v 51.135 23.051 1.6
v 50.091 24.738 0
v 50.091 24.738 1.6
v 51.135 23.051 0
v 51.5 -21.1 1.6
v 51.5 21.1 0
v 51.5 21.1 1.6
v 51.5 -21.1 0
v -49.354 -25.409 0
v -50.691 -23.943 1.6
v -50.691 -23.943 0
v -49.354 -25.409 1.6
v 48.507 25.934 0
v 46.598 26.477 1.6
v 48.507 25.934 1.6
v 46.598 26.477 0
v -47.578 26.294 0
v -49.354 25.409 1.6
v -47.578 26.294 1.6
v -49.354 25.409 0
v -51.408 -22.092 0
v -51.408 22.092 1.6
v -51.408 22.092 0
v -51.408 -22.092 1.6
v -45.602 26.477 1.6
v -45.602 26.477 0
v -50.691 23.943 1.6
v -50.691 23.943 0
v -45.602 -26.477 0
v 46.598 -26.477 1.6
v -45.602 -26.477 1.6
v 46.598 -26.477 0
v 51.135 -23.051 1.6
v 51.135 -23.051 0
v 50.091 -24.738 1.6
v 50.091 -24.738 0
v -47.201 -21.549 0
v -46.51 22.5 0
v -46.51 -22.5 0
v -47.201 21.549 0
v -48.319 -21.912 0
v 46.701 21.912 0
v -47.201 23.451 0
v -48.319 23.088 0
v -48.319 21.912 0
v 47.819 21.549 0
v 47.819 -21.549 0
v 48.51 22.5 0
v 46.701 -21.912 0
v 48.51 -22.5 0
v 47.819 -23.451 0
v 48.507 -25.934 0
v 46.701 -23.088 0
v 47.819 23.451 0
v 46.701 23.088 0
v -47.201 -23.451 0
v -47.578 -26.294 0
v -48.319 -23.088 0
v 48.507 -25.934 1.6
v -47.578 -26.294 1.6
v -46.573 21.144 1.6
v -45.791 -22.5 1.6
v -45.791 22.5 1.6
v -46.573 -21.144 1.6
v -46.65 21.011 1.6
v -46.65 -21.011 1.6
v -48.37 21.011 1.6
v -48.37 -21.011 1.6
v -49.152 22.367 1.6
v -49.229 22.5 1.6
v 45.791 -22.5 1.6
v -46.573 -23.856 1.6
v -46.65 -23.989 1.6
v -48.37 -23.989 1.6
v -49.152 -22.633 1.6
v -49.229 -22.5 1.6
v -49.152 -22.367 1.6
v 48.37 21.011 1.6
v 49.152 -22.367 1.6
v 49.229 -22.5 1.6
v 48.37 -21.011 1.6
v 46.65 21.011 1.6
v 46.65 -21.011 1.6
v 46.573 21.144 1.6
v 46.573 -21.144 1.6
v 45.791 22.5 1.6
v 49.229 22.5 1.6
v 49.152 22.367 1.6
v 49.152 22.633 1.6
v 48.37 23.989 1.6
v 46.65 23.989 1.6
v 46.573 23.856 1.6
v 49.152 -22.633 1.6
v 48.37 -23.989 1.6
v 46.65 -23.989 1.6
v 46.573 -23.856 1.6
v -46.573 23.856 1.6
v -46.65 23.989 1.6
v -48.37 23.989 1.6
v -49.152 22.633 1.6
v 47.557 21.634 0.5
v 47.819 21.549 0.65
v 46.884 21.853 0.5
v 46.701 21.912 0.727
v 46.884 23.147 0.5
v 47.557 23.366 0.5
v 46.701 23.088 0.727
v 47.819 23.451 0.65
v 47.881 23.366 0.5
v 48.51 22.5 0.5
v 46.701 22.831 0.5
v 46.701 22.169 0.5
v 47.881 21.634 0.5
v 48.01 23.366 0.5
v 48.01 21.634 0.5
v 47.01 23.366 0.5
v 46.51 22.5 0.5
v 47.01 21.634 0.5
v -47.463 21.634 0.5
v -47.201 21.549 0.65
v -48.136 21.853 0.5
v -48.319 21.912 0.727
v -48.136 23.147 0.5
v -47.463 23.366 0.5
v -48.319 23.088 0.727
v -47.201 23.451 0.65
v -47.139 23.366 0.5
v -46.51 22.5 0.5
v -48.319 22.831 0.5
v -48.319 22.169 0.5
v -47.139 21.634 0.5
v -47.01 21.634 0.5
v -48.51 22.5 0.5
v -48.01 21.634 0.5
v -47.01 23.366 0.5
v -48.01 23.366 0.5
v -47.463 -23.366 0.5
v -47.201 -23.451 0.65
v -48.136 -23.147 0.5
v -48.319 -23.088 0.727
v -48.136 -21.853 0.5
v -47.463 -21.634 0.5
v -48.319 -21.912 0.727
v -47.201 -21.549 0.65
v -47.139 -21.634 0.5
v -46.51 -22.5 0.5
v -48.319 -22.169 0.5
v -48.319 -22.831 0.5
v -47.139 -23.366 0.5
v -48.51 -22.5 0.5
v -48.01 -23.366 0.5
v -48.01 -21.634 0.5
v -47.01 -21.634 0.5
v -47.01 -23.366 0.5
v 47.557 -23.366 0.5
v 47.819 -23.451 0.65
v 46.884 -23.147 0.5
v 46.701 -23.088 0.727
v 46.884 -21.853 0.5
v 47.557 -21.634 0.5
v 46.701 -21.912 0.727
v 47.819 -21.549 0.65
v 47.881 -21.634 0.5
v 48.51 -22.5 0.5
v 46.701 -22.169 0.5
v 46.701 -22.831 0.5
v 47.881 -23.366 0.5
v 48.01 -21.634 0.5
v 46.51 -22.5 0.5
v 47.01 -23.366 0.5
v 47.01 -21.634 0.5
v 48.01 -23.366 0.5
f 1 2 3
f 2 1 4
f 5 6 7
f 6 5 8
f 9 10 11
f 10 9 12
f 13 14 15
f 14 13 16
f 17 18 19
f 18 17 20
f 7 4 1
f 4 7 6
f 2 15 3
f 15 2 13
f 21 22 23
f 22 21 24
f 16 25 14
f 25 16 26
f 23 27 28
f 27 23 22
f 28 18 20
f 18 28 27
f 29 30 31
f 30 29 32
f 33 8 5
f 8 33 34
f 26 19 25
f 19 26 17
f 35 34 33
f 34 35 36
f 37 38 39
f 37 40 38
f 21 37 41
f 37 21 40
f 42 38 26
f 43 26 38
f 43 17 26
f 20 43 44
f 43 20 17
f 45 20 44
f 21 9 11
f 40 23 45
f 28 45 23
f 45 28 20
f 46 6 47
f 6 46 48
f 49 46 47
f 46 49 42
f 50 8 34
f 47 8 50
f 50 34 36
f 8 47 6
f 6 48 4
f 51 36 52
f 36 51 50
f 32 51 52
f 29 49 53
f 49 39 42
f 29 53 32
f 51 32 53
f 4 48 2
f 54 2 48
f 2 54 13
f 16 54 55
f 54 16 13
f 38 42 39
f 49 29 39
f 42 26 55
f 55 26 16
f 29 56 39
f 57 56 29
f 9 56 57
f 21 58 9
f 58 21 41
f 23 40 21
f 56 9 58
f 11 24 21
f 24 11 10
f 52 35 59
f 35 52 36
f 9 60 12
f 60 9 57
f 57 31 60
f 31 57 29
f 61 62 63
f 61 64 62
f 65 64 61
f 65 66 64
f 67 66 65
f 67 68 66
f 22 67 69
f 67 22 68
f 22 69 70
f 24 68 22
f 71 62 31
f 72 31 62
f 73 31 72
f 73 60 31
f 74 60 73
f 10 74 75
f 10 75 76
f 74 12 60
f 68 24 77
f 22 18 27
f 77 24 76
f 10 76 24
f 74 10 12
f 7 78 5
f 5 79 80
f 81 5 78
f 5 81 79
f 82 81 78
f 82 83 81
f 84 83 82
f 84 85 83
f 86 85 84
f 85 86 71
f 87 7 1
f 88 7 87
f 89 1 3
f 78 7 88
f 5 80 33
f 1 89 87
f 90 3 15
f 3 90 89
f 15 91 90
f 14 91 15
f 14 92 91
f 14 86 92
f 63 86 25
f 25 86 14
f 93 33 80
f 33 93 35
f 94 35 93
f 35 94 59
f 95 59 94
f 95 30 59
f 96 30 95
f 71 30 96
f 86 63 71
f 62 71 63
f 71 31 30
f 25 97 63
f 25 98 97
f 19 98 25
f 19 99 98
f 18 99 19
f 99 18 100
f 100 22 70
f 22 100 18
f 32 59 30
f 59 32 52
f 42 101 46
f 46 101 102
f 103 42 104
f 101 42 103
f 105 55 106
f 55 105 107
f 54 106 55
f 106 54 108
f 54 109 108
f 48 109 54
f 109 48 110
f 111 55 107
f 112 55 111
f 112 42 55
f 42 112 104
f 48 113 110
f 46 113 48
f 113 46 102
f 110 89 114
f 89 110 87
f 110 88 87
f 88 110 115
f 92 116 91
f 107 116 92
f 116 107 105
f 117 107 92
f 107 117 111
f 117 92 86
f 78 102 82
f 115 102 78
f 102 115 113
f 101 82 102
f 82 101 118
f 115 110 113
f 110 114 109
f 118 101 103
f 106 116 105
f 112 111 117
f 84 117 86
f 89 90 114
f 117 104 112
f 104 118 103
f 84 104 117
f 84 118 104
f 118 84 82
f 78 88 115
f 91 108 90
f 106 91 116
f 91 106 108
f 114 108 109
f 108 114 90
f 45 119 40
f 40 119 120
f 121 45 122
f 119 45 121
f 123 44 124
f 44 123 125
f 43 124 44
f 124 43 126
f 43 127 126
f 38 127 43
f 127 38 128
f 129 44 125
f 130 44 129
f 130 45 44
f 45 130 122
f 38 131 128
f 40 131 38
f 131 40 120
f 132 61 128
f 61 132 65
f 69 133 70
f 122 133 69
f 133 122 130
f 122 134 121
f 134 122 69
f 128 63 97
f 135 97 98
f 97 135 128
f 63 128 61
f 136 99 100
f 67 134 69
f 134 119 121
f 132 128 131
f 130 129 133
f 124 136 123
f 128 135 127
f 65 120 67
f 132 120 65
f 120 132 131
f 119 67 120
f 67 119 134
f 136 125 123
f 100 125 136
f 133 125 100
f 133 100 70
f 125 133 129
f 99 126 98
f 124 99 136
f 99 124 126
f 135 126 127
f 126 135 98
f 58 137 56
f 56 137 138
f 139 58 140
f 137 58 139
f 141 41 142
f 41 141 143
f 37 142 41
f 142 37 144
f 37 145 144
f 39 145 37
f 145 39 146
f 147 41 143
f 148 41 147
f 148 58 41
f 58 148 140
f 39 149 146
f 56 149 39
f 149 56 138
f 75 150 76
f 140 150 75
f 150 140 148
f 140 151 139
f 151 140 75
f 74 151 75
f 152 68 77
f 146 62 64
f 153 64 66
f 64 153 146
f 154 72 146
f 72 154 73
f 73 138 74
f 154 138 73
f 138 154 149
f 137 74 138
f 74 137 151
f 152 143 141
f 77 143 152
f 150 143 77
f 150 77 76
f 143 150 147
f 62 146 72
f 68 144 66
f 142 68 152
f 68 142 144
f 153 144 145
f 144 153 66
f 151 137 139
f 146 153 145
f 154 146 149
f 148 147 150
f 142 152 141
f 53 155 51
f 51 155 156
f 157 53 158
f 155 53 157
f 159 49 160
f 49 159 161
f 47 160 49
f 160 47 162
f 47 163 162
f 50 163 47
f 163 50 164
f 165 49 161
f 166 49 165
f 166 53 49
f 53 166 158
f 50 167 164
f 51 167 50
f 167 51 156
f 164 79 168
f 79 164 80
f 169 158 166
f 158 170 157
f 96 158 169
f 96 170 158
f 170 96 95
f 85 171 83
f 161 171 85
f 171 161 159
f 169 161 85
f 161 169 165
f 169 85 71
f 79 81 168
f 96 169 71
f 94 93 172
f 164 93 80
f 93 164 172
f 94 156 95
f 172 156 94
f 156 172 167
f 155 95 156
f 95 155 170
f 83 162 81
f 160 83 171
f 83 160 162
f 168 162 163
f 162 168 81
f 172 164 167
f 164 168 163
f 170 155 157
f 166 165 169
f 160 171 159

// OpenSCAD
// file: ../configuration.scad
//UNIBOX04A
//------------------------------------------------------------
///*

rozmer_x=103;
rozmer_y=53;
sila=1.5;

roztec_srouby_x=95.02;
roztec_srouby_y=45;
prumer_sroubu=2;
zakulaceni_hrany=5.4;

roztec_der=10.16;
pocet_der_osa_x=8;
// main file
include <../configuration.scad>


//PLBASE ZAKLADNI
//------------------------------------------------------------

UNIBOX04A_D01();

module UNIBOX04A_D01(){

    difference () {

        translate([-(rozmer_x/2-zakulaceni_hrany),-(rozmer_y/2-zakulaceni_hrany),0]) 
            minkowski()
                {
                	cube([rozmer_x-2*zakulaceni_hrany,rozmer_y-2*zakulaceni_hrany,sila]);         
                        cylinder(r=zakulaceni_hrany,h=0.1);
                }
          
        //otvory
        translate([roztec_srouby_x/2,roztec_srouby_y/2,0])
            cylinder(sila*5, d=prumer_sroubu, center=true);   
        translate([roztec_srouby_x/2,roztec_srouby_y/2,0.5])
            cylinder(1.3, d1=prumer_sroubu, d2=3.7);   

          
        translate([-roztec_srouby_x/2,roztec_srouby_y/2,0])      
            cylinder(sila*5, d=prumer_sroubu, center=true);    
        translate([-roztec_srouby_x/2,roztec_srouby_y/2,0.5])      
            cylinder(1.3, d1=prumer_sroubu, d2=3.7);   
  


        translate([-roztec_srouby_x/2,-roztec_srouby_y/2,0])      
            cylinder(sila*5, d=prumer_sroubu, center=true);
        translate([-roztec_srouby_x/2,-roztec_srouby_y/2,0.5])      
            cylinder(1.3, d1=prumer_sroubu, d2=3.7);   

        translate([roztec_srouby_x/2,-roztec_srouby_y/2,0])      
            cylinder(sila*5, d=prumer_sroubu, center=true);
        translate([roztec_srouby_x/2,-roztec_srouby_y/2,0.5])      
            cylinder(1.3, d1=prumer_sroubu, d2=3.7);   

    }
}
